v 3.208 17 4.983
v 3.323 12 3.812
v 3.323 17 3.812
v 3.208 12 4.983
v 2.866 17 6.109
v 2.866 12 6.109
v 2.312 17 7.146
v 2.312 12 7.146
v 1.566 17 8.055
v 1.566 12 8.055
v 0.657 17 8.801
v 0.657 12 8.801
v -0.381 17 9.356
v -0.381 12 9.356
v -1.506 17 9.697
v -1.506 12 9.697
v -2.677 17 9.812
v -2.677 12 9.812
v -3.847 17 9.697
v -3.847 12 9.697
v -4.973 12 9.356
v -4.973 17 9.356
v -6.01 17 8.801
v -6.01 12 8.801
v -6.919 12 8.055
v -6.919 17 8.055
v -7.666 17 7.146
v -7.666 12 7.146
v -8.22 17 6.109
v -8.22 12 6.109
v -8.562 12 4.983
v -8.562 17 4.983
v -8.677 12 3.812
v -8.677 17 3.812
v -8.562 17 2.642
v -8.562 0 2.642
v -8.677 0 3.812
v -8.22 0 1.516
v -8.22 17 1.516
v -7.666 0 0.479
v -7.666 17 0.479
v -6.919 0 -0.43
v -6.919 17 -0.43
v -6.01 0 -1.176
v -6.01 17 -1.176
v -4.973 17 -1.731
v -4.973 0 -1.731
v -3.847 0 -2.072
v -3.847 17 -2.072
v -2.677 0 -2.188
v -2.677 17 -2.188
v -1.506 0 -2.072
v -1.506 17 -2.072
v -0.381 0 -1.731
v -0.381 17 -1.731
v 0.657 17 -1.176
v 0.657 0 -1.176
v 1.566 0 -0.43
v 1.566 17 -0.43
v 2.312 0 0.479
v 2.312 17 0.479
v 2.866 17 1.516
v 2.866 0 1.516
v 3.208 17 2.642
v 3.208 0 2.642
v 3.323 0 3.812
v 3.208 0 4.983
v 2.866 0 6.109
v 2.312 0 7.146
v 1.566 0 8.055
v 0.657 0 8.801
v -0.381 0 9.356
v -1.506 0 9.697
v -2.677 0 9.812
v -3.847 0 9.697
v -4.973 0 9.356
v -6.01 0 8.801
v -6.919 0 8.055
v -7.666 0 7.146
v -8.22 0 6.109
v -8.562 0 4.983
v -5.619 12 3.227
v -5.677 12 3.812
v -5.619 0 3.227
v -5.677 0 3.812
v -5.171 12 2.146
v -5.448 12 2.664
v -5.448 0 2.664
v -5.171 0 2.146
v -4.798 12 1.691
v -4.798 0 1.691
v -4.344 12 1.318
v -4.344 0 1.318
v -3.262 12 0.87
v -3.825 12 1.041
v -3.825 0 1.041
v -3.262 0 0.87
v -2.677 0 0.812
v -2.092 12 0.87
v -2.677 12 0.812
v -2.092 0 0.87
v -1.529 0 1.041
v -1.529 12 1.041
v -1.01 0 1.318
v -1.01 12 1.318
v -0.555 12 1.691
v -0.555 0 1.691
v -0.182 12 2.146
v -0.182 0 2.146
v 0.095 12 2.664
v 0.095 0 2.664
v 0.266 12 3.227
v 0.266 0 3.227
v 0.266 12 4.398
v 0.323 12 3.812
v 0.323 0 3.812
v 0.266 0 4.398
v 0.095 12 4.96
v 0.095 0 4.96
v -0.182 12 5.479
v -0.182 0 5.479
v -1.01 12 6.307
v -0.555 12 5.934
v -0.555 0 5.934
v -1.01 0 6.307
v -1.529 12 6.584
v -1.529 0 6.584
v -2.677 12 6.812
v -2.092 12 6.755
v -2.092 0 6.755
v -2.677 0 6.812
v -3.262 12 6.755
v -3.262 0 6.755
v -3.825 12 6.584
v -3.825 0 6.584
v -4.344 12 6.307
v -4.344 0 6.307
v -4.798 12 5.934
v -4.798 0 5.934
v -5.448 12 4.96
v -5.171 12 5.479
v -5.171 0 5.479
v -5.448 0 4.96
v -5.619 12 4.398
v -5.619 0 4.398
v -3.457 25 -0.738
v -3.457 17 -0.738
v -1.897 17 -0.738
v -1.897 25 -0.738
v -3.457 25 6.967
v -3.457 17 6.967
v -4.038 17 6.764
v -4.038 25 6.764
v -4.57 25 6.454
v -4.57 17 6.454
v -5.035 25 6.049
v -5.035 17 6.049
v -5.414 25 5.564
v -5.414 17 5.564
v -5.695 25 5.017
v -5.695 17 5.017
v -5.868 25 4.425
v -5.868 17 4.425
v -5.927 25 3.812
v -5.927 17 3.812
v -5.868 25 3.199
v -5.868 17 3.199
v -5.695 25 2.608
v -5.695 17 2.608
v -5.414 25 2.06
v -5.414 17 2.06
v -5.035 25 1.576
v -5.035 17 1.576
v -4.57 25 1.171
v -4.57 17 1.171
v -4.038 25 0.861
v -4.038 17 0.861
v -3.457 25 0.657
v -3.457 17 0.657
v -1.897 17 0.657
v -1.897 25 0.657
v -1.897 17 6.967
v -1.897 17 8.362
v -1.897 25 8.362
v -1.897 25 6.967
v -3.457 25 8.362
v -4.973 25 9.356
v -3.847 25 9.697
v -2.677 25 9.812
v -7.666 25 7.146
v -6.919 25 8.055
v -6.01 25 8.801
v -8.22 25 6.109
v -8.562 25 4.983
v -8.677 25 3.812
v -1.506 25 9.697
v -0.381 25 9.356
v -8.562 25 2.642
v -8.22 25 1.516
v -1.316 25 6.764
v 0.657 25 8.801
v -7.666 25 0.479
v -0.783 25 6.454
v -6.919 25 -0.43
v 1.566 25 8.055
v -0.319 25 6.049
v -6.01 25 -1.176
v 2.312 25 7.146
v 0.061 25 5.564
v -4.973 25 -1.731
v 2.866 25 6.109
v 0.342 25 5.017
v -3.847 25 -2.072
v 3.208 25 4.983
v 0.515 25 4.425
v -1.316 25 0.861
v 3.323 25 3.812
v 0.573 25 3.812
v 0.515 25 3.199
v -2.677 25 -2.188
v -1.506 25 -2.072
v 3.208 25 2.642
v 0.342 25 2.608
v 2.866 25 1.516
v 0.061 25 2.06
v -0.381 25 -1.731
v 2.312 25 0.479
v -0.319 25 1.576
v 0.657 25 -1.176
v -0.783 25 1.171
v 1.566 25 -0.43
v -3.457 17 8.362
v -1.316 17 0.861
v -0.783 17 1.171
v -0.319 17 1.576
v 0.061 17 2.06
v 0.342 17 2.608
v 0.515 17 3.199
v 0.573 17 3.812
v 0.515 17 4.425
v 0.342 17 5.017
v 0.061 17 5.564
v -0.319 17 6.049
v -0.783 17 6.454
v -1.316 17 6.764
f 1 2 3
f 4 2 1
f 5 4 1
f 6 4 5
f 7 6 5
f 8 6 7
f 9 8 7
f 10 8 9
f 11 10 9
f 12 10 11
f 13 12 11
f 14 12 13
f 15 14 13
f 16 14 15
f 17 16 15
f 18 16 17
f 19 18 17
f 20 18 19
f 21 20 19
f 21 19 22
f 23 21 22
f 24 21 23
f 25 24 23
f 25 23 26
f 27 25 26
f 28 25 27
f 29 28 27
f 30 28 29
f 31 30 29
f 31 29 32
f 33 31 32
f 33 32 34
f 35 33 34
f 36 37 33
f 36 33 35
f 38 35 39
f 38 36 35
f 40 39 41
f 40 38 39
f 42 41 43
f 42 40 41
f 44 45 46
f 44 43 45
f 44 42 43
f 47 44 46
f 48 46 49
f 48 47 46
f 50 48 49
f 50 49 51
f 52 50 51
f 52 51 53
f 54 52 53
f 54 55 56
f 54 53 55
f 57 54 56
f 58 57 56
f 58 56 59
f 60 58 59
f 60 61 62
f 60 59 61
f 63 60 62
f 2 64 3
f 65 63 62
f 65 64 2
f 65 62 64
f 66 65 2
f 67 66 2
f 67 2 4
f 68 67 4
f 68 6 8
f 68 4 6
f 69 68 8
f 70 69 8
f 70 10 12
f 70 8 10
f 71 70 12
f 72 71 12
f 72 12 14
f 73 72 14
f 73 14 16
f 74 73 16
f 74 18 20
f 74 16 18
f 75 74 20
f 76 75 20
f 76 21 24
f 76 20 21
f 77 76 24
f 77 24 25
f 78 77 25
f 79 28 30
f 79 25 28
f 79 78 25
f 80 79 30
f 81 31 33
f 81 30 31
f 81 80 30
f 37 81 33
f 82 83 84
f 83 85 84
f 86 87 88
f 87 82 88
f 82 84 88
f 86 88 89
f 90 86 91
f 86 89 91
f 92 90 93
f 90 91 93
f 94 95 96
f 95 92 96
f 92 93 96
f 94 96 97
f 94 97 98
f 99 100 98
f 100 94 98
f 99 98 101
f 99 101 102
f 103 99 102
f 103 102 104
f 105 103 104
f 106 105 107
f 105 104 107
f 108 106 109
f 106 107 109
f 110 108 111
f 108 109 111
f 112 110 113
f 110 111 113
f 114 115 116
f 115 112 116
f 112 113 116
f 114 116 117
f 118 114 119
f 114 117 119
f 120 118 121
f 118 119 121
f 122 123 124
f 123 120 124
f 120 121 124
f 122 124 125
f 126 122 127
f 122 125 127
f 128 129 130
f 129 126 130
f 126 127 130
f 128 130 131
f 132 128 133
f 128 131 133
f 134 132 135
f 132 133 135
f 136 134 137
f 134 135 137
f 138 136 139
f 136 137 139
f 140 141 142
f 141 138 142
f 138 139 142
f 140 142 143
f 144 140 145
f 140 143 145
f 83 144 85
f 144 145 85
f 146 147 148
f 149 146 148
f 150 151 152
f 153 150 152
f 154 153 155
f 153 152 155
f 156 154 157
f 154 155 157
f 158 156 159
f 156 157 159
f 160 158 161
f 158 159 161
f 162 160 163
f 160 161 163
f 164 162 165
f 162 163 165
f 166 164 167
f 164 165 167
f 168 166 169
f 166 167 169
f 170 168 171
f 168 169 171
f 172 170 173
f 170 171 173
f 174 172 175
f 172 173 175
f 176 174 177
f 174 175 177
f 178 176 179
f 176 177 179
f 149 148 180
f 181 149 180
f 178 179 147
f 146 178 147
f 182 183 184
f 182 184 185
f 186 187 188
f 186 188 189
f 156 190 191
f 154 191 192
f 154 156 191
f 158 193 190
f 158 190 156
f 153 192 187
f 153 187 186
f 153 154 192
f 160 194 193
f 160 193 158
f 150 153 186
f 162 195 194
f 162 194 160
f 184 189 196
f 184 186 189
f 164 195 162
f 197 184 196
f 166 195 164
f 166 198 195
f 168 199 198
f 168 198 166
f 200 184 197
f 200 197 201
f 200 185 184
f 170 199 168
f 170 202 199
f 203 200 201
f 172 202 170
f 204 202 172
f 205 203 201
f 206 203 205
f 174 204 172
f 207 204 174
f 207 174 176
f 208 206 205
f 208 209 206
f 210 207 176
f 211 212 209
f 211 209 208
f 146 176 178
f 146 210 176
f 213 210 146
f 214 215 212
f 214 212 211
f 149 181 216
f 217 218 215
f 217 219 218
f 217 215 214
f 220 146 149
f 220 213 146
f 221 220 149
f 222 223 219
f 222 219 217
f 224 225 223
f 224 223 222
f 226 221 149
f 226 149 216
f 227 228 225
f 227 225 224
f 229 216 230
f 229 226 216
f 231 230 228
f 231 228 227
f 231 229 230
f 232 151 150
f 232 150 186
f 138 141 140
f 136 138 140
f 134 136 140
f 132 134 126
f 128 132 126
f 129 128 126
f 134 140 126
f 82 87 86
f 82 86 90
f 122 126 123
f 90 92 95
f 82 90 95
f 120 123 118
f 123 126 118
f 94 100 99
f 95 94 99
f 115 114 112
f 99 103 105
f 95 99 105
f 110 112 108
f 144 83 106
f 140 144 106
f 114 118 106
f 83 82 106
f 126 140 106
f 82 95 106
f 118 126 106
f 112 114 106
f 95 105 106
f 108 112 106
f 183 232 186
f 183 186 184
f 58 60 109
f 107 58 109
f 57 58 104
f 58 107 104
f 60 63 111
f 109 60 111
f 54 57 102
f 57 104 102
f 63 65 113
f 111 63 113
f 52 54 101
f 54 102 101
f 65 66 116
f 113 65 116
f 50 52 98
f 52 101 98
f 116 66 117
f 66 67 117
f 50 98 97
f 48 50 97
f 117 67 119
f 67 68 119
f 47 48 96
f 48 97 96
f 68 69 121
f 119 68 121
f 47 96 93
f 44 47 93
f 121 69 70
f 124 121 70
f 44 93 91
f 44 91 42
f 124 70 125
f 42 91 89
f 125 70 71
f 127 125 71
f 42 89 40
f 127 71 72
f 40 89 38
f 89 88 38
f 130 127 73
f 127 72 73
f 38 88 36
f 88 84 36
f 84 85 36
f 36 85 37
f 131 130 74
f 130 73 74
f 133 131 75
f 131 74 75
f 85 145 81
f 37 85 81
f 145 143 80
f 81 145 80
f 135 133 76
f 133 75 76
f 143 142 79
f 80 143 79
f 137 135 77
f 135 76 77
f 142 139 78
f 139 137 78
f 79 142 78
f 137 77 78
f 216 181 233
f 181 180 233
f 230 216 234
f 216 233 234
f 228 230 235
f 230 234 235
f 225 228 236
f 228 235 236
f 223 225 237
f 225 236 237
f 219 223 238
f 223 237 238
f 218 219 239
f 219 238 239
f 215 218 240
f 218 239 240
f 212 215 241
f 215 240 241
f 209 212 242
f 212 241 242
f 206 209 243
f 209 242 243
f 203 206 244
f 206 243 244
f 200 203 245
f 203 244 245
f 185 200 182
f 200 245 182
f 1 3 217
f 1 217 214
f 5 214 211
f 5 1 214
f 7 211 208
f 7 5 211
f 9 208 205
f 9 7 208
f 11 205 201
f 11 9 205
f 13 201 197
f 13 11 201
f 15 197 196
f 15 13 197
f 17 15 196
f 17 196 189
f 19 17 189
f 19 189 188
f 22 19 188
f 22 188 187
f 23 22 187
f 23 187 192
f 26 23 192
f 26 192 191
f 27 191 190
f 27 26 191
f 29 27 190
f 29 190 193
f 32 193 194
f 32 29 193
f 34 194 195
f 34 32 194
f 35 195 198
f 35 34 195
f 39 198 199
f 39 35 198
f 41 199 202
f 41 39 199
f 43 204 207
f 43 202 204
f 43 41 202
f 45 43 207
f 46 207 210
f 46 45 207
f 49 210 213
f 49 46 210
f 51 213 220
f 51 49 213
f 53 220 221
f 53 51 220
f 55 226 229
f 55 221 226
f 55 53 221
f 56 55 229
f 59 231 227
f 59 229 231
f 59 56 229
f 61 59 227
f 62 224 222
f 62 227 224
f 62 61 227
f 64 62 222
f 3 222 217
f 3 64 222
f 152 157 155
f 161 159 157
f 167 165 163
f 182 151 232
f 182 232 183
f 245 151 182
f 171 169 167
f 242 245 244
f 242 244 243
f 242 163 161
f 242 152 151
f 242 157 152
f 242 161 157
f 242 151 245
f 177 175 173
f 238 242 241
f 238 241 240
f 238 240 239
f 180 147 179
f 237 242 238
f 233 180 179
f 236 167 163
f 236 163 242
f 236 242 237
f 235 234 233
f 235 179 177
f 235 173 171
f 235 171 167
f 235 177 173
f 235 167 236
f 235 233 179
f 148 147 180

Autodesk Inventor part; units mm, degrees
ref_plane "YZ Plane" through (0, 0, 0) normal (1, 0, 0) x (0, 1, 0)
ref_plane "XZ Plane" through (0, 0, 0) normal (0, 1, 0) x (-1, 0, 0)
ref_plane "XY Plane" through (0, 0, 0) normal (0, 0, 1) x (1, 0, 0)
sketch "Szkic1" plane through (0, 0, 0) normal (0, 1, 0) x (-1, 0, 0)
  circle A0 centre (2.6768, 3.8124) radius 6
  circle A1 centre (2.6768, 3.8124) radius 3
  point P0 (0, 0)
  dimension "d1" = 12
  dimension "d2" = 6
extrude "Wyciągnięcie proste1" add sketch "Szkic1" along normal blind 12
sketch "Szkic2" plane through (-2.6768, 12, 3.8124) normal (0, 1, 0) x (1, 0, 0)
  point P0 (2.6768, 3.8124)
sketch "Szkic4" plane through (-2.6768, 12, 3.8124) normal (0, 1, 0) x (1, 0, 0)
  circle A0 centre (0, 0) radius 6
  point P0 (2.6768, 3.8124)
  dimension "d5" = 12
extrude "Wyciągnięcie proste2" add sketch "Szkic4" along normal blind 5
sketch "Szkic5" plane through (-2.6768, 17, 3.8124) normal (0, 1, 0) x (1, 0, 0)
  circle A0 centre (0, 0) radius 6
  arc A1 (-0.78, 3.155) -> (-0.78, -3.155) centre (0, 0) ccw
  line L0 (-0.78, 4.55) -> (0.78, 4.55)
  line L1 (0.78, 4.55) -> (0.78, 3.155)
  line L2 (-0.78, -4.55) -> (0.78, -4.55)
  line L3 (0.78, -4.55) -> (0.78, -3.155)
  line L4 (-0.78, 3.155) -> (-0.78, 4.55)
  arc A2 (0.78, -3.155) -> (0.78, 3.155) centre (0, 0) ccw
  line L5 (-0.78, -3.155) -> (-0.78, -4.55)
  dimension "d8" = 12
  dimension "d10" = 1.56
  dimension "d12" = 1.56
extrude "Wyciągnięcie proste3" add sketch "Szkic5" along normal blind 8
properties part number "BlenderRoll"
